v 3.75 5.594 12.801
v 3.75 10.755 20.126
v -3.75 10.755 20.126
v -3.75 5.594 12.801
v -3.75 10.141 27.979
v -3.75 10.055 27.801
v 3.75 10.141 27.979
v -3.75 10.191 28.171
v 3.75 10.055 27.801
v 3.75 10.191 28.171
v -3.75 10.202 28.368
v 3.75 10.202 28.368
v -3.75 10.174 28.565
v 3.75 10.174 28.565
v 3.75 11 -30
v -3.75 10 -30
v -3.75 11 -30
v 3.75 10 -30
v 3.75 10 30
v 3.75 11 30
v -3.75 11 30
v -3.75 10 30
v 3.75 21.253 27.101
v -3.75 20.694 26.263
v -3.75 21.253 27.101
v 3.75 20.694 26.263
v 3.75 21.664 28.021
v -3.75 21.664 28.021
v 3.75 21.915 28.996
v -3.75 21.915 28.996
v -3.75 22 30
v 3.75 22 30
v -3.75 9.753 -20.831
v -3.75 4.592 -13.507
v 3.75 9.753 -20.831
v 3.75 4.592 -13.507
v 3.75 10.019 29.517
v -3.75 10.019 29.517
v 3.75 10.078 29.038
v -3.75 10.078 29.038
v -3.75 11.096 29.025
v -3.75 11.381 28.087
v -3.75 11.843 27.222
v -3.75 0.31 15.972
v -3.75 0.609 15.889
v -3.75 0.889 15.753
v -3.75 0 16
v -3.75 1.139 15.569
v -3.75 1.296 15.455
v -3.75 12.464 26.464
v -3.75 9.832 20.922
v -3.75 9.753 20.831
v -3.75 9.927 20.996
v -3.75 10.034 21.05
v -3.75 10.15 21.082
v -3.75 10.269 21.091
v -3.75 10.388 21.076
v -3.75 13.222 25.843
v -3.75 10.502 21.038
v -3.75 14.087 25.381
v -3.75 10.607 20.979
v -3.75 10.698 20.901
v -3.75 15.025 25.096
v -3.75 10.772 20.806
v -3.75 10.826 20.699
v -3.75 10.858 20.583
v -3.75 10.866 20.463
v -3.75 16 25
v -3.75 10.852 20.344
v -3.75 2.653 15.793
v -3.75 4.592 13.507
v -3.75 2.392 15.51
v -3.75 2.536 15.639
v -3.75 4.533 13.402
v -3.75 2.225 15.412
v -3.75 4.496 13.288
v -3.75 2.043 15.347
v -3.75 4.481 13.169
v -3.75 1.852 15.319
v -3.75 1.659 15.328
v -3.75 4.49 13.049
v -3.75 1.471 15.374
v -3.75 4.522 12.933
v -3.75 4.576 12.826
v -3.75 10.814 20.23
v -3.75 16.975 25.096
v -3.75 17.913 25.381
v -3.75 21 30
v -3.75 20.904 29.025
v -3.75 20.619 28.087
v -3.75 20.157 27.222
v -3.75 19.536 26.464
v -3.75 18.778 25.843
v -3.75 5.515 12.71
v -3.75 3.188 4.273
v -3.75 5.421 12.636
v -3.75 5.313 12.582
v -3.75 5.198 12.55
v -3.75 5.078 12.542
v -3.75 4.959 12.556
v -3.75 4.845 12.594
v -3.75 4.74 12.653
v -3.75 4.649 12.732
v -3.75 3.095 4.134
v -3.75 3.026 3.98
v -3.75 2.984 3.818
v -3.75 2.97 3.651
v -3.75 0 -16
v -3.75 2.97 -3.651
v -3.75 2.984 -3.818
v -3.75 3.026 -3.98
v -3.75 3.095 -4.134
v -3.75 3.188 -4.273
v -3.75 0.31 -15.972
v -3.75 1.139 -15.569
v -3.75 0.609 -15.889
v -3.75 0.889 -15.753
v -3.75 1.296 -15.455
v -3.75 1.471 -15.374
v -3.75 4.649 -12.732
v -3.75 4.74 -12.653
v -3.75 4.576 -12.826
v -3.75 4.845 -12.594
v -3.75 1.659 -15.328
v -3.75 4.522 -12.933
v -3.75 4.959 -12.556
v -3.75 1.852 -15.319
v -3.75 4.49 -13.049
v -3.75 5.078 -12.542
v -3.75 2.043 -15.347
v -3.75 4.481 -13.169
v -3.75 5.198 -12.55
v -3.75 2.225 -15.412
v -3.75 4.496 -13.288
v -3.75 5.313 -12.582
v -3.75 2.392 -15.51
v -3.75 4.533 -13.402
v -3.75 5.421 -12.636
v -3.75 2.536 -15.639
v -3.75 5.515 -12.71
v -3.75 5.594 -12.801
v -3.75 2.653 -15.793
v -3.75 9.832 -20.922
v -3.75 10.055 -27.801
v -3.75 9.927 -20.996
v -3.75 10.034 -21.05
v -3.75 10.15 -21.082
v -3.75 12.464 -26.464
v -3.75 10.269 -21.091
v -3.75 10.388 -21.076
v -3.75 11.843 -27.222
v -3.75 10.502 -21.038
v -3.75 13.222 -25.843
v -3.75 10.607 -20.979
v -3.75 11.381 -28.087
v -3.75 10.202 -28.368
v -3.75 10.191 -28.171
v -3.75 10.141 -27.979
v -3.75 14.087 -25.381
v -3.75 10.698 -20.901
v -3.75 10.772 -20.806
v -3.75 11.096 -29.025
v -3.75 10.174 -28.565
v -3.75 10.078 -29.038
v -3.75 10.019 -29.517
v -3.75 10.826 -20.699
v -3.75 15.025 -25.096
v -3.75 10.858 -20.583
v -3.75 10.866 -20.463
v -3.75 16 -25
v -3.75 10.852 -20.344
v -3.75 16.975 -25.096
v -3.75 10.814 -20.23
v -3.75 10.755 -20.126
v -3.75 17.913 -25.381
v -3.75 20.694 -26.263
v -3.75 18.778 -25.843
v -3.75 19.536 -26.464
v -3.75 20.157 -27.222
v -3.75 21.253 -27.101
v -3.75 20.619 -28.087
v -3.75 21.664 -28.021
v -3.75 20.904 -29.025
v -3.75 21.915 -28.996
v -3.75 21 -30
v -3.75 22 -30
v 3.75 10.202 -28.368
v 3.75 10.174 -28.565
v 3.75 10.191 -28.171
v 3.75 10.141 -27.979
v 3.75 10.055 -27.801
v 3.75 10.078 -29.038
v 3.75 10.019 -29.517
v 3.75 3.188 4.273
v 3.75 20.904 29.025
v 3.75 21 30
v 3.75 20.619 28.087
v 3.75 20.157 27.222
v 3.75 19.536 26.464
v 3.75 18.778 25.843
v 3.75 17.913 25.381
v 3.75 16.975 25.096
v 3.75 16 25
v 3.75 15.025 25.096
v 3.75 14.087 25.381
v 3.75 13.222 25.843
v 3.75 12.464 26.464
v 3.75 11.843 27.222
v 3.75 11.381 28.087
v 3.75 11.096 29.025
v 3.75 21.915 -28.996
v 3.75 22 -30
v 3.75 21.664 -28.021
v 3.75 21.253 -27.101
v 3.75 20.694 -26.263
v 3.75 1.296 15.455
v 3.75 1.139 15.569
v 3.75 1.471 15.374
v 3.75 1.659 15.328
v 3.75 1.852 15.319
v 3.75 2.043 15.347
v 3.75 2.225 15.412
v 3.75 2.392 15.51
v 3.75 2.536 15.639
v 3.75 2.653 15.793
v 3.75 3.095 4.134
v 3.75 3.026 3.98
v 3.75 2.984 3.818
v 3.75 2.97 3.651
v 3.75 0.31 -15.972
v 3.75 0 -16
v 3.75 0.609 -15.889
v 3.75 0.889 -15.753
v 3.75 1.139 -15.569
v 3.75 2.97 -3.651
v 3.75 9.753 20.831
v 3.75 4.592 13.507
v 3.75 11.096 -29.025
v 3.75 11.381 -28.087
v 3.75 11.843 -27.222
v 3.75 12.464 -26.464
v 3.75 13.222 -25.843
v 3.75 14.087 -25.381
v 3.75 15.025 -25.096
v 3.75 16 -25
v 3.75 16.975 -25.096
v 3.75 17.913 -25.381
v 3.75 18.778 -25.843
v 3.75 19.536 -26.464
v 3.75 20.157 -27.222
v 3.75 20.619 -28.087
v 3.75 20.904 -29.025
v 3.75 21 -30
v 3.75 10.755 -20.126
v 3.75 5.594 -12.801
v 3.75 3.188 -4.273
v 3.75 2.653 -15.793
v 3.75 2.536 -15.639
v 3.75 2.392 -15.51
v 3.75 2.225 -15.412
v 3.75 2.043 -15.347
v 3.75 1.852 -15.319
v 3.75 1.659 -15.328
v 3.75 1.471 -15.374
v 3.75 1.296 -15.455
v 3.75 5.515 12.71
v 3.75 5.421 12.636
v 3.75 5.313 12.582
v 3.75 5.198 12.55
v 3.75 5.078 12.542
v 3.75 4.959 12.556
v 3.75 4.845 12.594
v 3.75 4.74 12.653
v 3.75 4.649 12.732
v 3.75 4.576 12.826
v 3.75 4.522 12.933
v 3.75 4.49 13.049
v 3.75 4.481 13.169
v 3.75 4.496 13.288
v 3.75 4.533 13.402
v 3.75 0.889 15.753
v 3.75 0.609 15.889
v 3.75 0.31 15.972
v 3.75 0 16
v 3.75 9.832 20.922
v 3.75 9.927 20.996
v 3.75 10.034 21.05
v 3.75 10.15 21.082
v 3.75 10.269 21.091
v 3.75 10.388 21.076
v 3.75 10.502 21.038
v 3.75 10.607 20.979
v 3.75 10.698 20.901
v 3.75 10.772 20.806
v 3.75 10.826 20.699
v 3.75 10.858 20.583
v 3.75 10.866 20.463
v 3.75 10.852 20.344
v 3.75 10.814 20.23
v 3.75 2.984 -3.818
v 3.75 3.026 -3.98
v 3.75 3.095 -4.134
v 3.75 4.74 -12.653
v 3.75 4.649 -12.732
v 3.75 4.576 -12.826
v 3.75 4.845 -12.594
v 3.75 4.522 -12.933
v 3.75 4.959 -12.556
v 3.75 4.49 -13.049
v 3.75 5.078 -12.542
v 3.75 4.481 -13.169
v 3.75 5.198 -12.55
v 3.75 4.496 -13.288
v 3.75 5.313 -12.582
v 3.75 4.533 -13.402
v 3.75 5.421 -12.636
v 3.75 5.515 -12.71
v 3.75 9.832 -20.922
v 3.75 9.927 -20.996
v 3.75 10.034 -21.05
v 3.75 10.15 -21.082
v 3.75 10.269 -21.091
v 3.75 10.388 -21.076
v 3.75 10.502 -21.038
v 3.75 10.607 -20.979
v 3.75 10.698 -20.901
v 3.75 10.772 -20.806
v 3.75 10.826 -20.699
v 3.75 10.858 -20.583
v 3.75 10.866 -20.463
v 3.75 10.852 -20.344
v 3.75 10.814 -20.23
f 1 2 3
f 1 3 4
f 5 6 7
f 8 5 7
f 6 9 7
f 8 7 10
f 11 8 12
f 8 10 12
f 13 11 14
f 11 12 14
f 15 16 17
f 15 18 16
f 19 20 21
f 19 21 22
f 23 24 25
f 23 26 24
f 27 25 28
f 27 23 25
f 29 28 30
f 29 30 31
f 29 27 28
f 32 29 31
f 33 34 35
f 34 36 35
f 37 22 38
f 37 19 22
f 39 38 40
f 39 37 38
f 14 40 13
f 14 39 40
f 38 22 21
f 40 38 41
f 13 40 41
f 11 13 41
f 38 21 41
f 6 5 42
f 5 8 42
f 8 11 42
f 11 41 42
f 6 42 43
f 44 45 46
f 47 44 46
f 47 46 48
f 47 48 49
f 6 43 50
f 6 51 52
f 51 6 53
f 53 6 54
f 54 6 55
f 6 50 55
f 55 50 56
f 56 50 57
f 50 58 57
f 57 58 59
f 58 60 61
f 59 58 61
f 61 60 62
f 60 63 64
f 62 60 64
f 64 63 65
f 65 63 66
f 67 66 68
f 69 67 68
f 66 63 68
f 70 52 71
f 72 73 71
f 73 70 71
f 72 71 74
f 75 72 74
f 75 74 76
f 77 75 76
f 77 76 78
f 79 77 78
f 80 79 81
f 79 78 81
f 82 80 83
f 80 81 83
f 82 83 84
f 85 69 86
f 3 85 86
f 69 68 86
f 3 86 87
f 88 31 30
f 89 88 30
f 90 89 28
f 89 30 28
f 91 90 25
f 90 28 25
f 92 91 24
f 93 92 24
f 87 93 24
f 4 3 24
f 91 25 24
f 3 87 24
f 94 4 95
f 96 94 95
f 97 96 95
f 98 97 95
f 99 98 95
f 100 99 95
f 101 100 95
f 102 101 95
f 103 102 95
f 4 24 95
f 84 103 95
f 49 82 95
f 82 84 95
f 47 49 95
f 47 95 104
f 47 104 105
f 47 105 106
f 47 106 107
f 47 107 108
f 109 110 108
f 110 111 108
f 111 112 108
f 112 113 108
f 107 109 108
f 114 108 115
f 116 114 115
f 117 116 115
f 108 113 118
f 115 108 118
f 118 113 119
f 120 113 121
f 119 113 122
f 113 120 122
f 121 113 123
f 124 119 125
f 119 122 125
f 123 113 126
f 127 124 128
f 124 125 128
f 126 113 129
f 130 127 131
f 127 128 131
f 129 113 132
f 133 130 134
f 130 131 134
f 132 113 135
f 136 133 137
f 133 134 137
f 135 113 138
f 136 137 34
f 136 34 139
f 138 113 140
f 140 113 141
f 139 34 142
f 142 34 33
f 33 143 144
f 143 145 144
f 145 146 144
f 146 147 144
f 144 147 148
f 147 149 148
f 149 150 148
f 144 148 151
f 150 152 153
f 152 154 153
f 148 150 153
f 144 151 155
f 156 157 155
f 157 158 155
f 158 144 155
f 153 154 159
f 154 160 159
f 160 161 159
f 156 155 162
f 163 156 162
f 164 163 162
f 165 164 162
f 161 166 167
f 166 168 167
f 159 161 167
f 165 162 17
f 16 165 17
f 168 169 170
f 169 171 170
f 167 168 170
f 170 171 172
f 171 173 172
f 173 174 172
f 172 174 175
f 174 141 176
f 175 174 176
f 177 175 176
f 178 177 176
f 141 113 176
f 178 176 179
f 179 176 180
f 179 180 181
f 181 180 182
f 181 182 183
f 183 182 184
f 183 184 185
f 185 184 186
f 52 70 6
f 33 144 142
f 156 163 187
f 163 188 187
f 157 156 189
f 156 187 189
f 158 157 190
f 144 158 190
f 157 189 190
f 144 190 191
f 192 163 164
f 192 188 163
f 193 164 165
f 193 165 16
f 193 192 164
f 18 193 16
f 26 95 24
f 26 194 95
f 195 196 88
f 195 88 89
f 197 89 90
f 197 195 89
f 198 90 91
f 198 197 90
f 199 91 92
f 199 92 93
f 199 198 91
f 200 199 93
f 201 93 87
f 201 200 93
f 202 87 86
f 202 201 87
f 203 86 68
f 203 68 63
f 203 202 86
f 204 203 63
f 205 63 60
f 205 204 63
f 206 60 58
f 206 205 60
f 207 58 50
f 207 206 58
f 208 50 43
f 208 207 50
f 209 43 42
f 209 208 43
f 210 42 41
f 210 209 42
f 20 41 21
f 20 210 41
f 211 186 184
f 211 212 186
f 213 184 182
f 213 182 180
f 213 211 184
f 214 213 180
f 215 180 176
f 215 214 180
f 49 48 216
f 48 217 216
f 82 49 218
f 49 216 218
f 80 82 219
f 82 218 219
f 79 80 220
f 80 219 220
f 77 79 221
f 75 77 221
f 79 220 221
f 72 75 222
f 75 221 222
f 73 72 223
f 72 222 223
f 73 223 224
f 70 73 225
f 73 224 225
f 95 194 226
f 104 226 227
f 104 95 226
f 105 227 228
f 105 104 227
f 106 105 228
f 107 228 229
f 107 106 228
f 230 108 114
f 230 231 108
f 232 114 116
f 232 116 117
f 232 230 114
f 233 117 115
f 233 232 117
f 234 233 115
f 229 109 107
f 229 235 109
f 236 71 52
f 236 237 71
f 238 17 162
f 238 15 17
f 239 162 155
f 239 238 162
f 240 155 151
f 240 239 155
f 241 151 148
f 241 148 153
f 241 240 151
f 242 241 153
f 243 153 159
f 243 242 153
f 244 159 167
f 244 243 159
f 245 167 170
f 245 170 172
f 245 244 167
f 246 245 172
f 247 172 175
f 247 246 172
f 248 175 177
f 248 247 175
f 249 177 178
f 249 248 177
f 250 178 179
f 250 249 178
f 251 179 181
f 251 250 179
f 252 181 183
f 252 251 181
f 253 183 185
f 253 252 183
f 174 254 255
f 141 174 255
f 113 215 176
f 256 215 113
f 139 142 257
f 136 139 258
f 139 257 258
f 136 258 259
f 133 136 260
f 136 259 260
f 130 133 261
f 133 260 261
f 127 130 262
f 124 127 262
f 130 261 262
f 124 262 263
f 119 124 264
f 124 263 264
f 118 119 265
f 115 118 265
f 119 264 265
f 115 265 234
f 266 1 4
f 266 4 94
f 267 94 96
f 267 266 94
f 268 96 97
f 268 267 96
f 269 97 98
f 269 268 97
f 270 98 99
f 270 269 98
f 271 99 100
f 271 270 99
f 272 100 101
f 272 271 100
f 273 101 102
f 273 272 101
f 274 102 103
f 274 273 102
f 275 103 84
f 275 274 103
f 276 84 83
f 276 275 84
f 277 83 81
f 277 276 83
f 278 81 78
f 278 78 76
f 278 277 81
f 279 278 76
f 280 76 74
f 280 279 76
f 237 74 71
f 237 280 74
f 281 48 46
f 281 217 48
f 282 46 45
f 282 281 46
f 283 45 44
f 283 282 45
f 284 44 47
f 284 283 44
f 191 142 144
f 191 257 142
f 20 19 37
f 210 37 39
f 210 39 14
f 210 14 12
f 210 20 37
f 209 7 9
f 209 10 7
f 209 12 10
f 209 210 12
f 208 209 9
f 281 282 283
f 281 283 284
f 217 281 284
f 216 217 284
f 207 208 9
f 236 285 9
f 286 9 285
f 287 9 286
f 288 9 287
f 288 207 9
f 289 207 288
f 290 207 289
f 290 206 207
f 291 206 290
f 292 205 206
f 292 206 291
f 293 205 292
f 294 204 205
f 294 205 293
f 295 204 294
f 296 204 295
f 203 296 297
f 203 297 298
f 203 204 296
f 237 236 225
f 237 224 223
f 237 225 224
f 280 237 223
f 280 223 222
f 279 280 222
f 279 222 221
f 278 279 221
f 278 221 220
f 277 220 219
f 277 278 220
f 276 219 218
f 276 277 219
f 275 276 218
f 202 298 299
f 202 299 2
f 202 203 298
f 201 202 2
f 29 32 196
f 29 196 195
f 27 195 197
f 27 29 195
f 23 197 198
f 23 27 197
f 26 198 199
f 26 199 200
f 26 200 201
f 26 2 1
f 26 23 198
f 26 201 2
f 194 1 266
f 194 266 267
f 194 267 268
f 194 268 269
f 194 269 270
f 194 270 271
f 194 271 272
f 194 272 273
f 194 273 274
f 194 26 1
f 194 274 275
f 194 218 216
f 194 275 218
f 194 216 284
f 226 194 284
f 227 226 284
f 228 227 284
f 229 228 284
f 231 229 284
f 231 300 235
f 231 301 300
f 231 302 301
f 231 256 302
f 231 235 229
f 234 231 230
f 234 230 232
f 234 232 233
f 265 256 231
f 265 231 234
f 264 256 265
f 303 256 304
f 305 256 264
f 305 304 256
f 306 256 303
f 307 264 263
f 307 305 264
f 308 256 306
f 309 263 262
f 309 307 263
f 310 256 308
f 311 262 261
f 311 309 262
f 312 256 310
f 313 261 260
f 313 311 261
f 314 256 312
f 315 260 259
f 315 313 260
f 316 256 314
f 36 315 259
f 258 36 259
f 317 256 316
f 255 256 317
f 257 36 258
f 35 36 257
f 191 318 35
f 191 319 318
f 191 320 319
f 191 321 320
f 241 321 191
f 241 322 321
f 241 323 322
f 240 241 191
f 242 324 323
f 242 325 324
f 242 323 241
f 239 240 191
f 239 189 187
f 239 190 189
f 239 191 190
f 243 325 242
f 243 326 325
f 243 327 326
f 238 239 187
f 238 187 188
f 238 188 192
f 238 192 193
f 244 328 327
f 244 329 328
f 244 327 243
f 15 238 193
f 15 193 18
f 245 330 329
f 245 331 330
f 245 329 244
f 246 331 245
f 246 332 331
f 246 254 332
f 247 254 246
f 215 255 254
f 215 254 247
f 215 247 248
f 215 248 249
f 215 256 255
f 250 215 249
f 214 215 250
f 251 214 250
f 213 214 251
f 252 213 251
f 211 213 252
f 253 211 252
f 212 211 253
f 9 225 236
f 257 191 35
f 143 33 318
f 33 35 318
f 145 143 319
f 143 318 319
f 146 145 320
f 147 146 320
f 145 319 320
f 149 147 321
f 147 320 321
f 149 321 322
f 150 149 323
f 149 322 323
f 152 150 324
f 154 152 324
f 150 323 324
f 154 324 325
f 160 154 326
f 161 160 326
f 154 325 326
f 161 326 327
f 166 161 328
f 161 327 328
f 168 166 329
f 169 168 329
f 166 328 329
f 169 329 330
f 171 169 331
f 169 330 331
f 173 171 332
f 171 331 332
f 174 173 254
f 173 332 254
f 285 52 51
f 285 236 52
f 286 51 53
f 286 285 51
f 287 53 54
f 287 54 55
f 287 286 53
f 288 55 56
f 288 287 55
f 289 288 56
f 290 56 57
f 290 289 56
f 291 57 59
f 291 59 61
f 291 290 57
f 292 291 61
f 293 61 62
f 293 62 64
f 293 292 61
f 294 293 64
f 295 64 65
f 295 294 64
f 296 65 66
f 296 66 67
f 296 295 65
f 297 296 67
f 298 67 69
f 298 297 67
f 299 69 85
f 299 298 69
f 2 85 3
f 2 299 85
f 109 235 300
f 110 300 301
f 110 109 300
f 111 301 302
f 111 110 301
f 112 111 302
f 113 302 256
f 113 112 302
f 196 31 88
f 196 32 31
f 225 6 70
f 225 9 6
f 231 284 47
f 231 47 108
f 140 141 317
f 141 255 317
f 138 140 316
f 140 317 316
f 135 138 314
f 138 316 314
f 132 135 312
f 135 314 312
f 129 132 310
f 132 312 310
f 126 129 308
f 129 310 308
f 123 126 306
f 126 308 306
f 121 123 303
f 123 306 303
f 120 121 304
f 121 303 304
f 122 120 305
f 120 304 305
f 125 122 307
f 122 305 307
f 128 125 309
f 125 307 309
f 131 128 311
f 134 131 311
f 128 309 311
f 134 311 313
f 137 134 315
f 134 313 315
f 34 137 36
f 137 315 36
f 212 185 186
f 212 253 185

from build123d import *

# Parameters (mm, degrees)
ESTRUSIONE_ESTRUSIONE1_DEPTH = 3.75
RACCORDO2_R                  = 1


with BuildPart() as part:
    # Schizzo1 → Estrusione-Estrusione1 (new body, symmetric)
    with BuildSketch(Plane(origin=(0, 0, 0), x_dir=(0, 0, -1), z_dir=(1, 0, 0))):
        with BuildLine():
            Line((-30, 22), (-30, 21))
            ThreePointArc((-30, 21), (-25, 16), (-30, 11))
            Line((-30, 11), (-30, 10))
            ThreePointArc((-30, 10), (-29.075946517, 10.07158325), (-28.173941951, 10.284624946))
            Line((-28.173941951, 10.284624946), (-14.279791844, 1.720208156))
            ThreePointArc((-14.279791844, 1.720208156), (-15.496162696, 1.216370852), (-16, 0))
            Line((-16, 0), (16, 0))
            ThreePointArc((16, 0), (15.496162696, 1.216370852), (14.279791844, 1.720208156))
            Line((14.279791844, 1.720208156), (28.173941951, 10.284624946))
            ThreePointArc((28.173941951, 10.284624946), (29.075946517, 10.07158325), (30, 10))
            Line((30, 10), (30, 11))
            ThreePointArc((30, 11), (25, 16), (30, 21))
            Line((30, 21), (30, 22))
            ThreePointArc((30, 22), (28.020680207, 21.664123335), (26.262962858, 20.694097719))
            Line((26.262962858, 20.694097719), (4, 2.970240215))
            Line((4, 2.970240215), (-4, 2.970240215))
            Line((-4, 2.970240215), (-26.262962858, 20.694097719))
            ThreePointArc((-26.262962858, 20.694097719), (-28.020680207, 21.664123335), (-30, 22))
        make_face()
        with BuildLine():
            Line((-20.125796974, 10.754754637), (-12.80100478, 5.593685162))
            ThreePointArc((-12.80100478, 5.593685162), (-12.653117343, 4.740293889), (-13.506508616, 4.592406452))
            Line((-13.506508616, 4.592406452), (-20.83130081, 9.753475926))
            ThreePointArc((-20.83130081, 9.753475926), (-20.979188247, 10.606867199), (-20.125796974, 10.754754637))
        make_face(mode=Mode.SUBTRACT)
        with BuildLine():
            Line((20.125796974, 10.754754637), (12.80100478, 5.593685162))
            ThreePointArc((12.80100478, 5.593685162), (12.653117343, 4.740293889), (13.506508616, 4.592406452))
            Line((13.506508616, 4.592406452), (20.83130081, 9.753475926))
            ThreePointArc((20.83130081, 9.753475926), (20.979188247, 10.606867199), (20.125796974, 10.754754637))
        make_face(mode=Mode.SUBTRACT)
    extrude(amount=ESTRUSIONE_ESTRUSIONE1_DEPTH, both=True)

    # Raccordo2
    raccordo2_edges = [part.edges().sort_by_distance(p)[0] for p in [
        (0, 2.970240215, 4),
        (0, 2.970240215, -4),
        (0, 10.284624946, -28.173941951),
        (0, 1.720208156, -14.279791844),
        (0, 1.720208156, 14.279791844),
        (0, 10.284624946, 28.173941951),
    ]]
    fillet(raccordo2_edges, radius=RACCORDO2_R)


solid = part.part
